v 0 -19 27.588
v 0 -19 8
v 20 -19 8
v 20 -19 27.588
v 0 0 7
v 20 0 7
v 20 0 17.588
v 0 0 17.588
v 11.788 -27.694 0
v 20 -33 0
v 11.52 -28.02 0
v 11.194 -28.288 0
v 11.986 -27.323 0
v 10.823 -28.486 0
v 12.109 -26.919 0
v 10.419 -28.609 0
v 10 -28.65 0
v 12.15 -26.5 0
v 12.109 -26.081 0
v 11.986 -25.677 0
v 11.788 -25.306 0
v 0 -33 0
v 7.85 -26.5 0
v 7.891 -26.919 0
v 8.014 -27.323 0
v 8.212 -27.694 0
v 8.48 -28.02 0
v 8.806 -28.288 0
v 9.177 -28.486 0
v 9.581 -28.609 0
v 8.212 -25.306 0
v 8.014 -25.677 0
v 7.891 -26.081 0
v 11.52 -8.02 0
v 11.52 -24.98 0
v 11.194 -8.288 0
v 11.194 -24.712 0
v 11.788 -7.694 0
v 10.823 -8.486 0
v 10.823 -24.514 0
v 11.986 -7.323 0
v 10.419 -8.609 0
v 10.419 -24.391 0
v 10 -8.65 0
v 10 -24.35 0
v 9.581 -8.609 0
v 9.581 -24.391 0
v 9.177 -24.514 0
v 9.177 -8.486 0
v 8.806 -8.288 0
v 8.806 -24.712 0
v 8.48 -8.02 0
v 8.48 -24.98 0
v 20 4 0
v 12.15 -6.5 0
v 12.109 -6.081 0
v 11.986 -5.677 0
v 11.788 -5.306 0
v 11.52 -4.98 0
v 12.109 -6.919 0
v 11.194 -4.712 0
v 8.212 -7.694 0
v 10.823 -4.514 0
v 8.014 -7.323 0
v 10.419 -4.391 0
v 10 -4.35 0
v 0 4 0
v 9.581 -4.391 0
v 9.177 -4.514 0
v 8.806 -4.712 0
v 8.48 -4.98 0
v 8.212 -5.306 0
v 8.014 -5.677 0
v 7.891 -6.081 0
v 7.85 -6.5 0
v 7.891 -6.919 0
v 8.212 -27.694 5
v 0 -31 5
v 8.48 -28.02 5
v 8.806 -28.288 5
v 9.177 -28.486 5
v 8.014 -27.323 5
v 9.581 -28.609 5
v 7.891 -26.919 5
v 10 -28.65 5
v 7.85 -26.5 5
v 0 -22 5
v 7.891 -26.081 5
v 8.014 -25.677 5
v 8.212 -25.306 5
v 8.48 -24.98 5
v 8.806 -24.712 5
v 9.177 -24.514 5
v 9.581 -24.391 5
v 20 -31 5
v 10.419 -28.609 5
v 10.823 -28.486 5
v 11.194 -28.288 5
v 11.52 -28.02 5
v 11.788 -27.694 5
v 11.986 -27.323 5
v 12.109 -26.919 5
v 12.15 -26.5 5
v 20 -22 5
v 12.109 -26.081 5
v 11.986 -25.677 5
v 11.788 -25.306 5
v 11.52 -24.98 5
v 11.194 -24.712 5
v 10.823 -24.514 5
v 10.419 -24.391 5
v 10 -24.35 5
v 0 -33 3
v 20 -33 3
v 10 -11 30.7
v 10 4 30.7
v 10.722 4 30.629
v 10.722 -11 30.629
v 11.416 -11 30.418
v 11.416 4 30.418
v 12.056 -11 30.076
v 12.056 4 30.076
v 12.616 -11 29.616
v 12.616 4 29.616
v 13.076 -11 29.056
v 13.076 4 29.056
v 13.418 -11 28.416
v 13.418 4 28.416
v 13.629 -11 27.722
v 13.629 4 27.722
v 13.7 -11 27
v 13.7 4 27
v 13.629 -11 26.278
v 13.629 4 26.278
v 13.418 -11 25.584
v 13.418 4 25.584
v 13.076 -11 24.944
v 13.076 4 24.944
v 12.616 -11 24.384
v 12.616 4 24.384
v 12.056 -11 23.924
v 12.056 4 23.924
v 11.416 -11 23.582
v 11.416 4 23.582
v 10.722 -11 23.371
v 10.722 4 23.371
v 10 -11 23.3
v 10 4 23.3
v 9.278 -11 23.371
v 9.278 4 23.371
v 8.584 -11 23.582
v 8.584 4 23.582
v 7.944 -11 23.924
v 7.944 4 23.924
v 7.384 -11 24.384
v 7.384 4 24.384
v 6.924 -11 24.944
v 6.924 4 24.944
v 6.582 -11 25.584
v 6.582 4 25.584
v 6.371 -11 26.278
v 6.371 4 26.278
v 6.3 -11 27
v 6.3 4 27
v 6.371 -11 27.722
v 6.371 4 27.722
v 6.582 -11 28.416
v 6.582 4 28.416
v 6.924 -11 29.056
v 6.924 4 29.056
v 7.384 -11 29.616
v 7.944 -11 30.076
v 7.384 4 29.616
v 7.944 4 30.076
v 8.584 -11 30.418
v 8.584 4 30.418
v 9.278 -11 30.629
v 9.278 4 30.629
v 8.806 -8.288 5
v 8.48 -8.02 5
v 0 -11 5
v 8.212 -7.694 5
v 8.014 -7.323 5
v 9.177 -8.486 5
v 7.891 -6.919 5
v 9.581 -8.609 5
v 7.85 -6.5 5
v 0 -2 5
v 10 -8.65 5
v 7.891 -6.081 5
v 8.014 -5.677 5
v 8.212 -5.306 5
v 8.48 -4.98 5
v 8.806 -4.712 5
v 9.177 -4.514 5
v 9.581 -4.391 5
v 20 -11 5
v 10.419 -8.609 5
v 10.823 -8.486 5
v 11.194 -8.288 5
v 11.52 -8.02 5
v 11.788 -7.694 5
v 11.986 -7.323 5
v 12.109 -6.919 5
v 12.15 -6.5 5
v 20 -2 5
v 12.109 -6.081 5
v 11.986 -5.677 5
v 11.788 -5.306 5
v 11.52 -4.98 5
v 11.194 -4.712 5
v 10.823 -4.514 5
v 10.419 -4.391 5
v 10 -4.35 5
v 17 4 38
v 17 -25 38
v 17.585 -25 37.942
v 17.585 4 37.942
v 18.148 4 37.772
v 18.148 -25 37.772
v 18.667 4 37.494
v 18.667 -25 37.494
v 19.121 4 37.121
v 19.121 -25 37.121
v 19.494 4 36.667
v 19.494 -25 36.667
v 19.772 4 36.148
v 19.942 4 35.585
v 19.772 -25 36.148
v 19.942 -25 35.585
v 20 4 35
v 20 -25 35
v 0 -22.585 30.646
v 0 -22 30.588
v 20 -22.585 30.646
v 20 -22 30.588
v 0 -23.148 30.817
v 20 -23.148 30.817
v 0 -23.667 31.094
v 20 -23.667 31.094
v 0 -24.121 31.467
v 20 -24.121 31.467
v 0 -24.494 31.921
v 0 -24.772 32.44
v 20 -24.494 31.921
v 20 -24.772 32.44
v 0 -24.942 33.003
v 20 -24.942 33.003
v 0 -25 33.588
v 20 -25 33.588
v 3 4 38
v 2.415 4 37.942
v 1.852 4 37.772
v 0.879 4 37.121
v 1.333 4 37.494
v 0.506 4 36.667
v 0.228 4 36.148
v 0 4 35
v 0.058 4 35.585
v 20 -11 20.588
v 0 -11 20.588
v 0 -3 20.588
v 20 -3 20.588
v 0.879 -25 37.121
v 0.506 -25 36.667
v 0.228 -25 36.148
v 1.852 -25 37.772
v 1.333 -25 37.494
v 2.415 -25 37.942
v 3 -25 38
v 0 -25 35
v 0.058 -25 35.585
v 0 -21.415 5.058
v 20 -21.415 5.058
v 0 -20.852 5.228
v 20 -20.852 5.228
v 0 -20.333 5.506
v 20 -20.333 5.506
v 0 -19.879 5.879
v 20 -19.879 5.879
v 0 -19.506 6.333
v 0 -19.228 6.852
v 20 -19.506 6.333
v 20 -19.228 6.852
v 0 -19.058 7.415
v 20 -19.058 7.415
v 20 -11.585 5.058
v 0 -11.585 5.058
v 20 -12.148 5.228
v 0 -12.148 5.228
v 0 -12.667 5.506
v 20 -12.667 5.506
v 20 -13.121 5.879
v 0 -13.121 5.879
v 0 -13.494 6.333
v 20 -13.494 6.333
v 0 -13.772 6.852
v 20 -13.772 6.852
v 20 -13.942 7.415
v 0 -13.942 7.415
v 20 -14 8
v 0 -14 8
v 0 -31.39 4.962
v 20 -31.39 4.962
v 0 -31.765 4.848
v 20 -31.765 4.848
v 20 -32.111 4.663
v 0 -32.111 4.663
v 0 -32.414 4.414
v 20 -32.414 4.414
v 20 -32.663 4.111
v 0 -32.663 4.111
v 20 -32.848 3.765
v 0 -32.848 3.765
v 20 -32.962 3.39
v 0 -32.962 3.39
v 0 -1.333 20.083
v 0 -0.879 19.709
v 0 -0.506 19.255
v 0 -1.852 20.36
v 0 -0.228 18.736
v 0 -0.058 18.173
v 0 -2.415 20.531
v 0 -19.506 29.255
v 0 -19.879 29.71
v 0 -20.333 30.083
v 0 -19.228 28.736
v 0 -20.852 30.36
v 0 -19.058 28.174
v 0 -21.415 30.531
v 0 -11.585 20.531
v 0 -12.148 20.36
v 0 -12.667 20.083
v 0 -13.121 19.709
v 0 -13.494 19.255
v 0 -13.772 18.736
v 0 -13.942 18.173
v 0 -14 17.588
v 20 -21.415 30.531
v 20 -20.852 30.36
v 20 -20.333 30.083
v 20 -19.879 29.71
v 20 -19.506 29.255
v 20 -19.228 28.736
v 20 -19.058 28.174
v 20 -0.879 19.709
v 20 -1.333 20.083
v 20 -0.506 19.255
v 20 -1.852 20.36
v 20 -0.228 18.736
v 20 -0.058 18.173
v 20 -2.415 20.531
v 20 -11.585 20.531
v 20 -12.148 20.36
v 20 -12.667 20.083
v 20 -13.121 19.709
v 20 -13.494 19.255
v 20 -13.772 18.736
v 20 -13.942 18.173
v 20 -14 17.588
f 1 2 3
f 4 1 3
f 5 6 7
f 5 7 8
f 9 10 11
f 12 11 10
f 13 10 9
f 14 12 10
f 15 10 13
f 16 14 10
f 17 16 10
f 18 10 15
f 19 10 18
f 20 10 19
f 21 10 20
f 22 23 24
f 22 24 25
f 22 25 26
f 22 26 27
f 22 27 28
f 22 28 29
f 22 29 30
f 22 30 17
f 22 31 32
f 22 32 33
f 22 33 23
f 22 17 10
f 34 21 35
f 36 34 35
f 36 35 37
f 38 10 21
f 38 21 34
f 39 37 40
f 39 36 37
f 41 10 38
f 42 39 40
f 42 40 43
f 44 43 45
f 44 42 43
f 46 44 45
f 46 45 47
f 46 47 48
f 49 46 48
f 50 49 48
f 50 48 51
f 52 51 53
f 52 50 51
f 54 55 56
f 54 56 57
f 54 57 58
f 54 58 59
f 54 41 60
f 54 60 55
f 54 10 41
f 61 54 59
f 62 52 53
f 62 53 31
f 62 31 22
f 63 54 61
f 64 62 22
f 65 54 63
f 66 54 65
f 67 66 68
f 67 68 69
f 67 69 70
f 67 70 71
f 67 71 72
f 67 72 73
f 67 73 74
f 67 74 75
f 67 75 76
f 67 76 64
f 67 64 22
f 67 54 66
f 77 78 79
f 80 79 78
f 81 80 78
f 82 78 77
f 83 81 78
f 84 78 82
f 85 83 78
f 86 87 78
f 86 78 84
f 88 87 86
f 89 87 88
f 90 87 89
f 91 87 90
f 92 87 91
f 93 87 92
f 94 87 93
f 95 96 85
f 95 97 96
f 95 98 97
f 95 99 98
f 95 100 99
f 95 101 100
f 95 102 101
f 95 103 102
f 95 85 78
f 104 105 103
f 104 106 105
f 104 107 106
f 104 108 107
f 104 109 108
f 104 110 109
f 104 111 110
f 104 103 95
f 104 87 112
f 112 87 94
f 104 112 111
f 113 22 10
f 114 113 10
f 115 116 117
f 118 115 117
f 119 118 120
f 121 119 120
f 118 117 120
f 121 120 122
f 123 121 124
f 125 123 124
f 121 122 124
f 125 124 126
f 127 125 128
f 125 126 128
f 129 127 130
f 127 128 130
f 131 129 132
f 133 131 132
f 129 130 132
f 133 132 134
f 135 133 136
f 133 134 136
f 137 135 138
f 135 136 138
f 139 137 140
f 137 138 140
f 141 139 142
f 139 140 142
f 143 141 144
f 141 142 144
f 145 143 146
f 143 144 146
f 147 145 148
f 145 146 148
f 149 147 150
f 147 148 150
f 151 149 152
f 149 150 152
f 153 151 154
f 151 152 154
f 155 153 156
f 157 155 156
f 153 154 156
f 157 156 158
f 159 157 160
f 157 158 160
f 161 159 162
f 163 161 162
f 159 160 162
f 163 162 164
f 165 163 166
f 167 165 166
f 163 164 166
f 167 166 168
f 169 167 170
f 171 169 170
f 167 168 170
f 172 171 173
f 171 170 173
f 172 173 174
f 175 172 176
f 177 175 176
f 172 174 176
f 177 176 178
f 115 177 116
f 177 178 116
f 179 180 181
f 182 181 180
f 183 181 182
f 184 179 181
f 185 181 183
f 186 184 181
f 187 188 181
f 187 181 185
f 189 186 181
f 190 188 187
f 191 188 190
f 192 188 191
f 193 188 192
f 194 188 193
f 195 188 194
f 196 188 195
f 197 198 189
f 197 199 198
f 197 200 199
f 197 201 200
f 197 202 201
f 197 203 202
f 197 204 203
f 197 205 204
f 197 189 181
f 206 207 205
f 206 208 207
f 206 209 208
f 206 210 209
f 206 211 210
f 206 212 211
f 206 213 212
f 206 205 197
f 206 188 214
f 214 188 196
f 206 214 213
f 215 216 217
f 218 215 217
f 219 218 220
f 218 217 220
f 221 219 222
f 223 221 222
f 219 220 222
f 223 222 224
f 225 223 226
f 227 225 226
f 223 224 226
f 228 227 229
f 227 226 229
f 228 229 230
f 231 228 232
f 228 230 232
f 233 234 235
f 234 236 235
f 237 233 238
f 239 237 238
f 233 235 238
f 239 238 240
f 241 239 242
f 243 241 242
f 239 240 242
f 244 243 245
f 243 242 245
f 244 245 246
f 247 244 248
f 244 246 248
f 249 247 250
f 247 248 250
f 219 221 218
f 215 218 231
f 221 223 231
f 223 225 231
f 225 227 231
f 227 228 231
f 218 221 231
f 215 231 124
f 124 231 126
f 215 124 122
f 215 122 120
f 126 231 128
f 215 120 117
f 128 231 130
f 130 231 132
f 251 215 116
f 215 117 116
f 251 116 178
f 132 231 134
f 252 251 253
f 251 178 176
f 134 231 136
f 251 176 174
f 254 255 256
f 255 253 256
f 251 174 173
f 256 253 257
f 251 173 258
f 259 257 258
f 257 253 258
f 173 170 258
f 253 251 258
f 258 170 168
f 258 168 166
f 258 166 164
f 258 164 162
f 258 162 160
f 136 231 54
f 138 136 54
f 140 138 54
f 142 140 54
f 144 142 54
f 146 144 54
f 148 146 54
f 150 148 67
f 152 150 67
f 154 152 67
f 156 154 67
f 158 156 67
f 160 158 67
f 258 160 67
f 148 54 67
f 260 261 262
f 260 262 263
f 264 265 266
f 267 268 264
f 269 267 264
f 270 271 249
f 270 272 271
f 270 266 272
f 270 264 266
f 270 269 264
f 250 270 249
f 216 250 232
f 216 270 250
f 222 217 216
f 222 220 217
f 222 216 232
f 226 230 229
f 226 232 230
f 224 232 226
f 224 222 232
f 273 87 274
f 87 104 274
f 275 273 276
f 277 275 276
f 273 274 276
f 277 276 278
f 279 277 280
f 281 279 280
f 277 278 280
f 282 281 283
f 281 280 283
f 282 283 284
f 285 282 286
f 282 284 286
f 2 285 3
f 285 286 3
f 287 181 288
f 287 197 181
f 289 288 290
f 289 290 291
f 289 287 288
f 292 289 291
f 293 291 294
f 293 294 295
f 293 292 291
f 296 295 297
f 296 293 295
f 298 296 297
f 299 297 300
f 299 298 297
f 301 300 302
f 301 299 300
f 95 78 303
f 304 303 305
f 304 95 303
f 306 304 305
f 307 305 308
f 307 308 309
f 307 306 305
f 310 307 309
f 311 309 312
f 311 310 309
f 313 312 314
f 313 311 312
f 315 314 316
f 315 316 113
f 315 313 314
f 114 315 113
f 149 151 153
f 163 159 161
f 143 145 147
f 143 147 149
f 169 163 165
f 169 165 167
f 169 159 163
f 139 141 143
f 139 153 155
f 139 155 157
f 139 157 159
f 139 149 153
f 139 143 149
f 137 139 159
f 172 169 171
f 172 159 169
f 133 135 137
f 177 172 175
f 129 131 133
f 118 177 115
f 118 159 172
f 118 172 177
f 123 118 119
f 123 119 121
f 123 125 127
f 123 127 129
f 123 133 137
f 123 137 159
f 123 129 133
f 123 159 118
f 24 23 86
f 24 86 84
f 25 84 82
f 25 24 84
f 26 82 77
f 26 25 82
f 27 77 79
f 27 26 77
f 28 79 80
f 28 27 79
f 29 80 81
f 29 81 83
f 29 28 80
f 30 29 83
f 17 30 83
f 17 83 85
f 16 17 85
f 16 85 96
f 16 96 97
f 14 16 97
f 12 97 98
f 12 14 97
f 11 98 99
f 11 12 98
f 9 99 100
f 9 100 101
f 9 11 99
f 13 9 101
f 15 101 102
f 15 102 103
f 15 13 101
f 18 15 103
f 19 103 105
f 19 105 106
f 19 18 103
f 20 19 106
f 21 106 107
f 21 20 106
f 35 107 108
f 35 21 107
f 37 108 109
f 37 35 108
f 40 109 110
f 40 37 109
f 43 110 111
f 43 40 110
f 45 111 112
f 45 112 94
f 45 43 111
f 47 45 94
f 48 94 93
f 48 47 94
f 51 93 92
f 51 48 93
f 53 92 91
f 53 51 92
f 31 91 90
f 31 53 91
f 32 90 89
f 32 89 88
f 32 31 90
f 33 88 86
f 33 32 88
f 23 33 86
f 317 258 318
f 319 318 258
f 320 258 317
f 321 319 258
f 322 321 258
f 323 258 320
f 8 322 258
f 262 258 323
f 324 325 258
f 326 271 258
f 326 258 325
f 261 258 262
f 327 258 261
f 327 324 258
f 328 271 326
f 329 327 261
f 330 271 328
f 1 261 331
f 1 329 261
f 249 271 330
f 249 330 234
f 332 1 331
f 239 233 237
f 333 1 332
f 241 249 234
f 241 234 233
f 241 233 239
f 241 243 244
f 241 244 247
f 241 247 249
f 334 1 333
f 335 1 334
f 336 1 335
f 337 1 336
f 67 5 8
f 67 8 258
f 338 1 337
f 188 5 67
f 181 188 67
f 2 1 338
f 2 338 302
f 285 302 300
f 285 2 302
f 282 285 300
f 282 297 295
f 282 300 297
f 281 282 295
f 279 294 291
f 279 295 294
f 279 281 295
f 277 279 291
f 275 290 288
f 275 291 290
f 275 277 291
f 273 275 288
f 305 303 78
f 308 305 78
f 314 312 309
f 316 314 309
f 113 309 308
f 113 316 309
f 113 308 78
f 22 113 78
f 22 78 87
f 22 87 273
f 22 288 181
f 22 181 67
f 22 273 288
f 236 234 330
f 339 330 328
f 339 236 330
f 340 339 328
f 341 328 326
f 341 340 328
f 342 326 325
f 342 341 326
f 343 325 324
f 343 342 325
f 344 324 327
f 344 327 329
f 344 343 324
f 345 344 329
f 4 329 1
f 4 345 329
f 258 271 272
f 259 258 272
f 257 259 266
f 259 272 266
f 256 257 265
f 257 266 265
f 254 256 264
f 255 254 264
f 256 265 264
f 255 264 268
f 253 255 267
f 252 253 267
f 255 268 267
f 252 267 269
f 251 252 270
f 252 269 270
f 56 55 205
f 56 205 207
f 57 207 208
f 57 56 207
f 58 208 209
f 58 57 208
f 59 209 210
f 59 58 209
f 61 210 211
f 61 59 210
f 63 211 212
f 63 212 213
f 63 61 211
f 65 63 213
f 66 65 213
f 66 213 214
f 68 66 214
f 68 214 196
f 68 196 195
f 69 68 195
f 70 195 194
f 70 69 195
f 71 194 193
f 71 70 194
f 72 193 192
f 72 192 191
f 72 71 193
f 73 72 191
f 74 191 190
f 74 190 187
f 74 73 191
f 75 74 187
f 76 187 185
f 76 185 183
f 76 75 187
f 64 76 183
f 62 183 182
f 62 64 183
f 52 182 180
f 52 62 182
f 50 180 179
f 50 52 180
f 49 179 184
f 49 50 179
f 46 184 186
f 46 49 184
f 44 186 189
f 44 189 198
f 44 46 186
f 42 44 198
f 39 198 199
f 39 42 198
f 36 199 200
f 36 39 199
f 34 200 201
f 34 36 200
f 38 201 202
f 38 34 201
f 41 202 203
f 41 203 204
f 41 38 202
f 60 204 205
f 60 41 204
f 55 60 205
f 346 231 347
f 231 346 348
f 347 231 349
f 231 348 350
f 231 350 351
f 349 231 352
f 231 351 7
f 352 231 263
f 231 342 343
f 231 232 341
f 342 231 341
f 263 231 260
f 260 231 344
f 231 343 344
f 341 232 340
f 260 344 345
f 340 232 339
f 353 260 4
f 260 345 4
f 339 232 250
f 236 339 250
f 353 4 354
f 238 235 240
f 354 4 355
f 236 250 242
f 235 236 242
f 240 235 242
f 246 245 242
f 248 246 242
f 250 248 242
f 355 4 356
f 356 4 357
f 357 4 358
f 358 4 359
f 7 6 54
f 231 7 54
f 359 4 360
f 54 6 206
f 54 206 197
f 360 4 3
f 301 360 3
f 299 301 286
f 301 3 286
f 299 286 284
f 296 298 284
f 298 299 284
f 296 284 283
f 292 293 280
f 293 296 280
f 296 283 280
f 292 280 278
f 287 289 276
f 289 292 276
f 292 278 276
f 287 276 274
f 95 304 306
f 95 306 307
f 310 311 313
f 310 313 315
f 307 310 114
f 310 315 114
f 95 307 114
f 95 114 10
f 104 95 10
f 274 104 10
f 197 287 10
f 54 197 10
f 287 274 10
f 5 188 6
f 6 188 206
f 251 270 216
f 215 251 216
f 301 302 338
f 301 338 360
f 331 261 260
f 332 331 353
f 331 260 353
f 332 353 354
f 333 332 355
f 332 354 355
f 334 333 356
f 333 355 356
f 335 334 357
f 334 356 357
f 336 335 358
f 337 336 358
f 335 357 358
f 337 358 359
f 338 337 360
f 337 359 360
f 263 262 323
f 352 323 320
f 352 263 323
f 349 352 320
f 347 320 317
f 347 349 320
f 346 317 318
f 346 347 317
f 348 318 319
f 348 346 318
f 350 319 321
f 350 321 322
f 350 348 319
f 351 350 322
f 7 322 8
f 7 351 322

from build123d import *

# Parameters (mm, degrees)
SKETCH1_W           = 20
SKETCH1_H           = 33
SKETCH1_R           = 2.15
BOSS_EXTRUDE1_DEPTH = 5
SKETCH2_W           = 20
SKETCH2_H           = 4
BOSS_EXTRUDE2_DEPTH = 38
SKETCH4_W           = 20
SKETCH4_H           = 7.411842069
BOSS_EXTRUDE3_DEPTH = 25
FILLET1_R           = 3
FILLET2_R           = 2
FILLET4_R           = 3
CHAMFER2_SIZE       = 2
SKETCH8_W           = 20
SKETCH8_H           = 5
BOSS_EXTRUDE5_DEPTH = 25.588157931
FILLET7_R           = 3
SKETCH12_W          = 20
SKETCH12_H          = 10
BOSS_EXTRUDE6_DEPTH = 14
SKETCH3_R           = 3.7
CUT_EXTRUDE2_DEPTH  = 15
FILLET8_R           = 3


with BuildPart() as part:
    # Sketch1 → Boss-Extrude1 (new body)
    with BuildSketch(Plane.XY):
        with Locations((10, -16.5)):
            Rectangle(SKETCH1_W, SKETCH1_H)
        with Locations((10, -6.5)):
            Circle(SKETCH1_R, mode=Mode.SUBTRACT)
        with Locations(Location((10, -26.5, 0), (0, 0, 180))):
            Circle(SKETCH1_R, mode=Mode.SUBTRACT)
    extrude(amount=BOSS_EXTRUDE1_DEPTH)

    # Sketch2 → Boss-Extrude2 (add)
    with BuildSketch(Plane(origin=(0, 0, 0), x_dir=(-1, 0, 0), z_dir=(0, 0, -1))):
        with Locations((-10, 2)):
            Rectangle(SKETCH2_W, SKETCH2_H)
    extrude(amount=-BOSS_EXTRUDE2_DEPTH)

    # Sketch4 → Boss-Extrude3 (add)
    with BuildSketch(Plane.XZ):
        with Locations((10, 34.294078965)):
            Rectangle(SKETCH4_W, SKETCH4_H)
    extrude(amount=BOSS_EXTRUDE3_DEPTH)

    # Fillet1
    fillet1_edges = [part.edges().sort_by_distance(p)[0] for p in [
        (20, -10.5, 38),
        (0, -10.5, 38),
    ]]
    fillet(fillet1_edges, radius=FILLET1_R)

    # Fillet2
    fillet2_edges = [part.edges().sort_by_distance(p)[0] for p in [
        (10, -33, 5),
    ]]
    fillet(fillet2_edges, radius=FILLET2_R)

    # Fillet4
    fillet4_edges = [part.edges().sort_by_distance(p)[0] for p in [
        (10, -25, 30.588157931),
    ]]
    fillet(fillet4_edges, radius=FILLET4_R)

    # Chamfer2
    chamfer2_edges = [part.edges().sort_by_distance(p)[0] for p in [
        (10, 0, 5),
    ]]
    chamfer(chamfer2_edges, length=CHAMFER2_SIZE)

    # Sketch8 → Boss-Extrude5 (add)
    with BuildSketch(Plane.XY.offset(5)):
        with Locations((10, -16.5)):
            Rectangle(SKETCH8_W, SKETCH8_H)
    extrude(amount=BOSS_EXTRUDE5_DEPTH)

    # Fillet7
    fillet7_edges = [part.edges().sort_by_distance(p)[0] for p in [
        (10, -19, 5),
        (10, -19, 30.588157931),
        (10, -14, 5),
    ]]
    fillet(fillet7_edges, radius=FILLET7_R - 0.0001)  # a hair under: the kernel refuses the full size

    # Sketch12 → Boss-Extrude6 (add)
    with BuildSketch(Plane(origin=(0, -14, 0), x_dir=(1, 0, 0), z_dir=(0, 1, 0))):
        with Locations((10, -25.588157931)):
            Rectangle(SKETCH12_W, SKETCH12_H)
    extrude(amount=BOSS_EXTRUDE6_DEPTH)

    # Sketch3 → Cut-Extrude2 (cut)
    with BuildSketch(Plane(origin=(0, 4, 0), x_dir=(1, 0, 0), z_dir=(0, 1, 0))):
        with Locations(Location((10, -27, 0), (0, 0, 270))):
            Circle(SKETCH3_R)
    extrude(amount=-CUT_EXTRUDE2_DEPTH, mode=Mode.SUBTRACT)

    # Fillet8
    fillet8_edges = [part.edges().sort_by_distance(p)[0] for p in [
        (10, 0, 20.588157931),
        (10, -14, 20.588157931),
    ]]
    fillet(fillet8_edges, radius=FILLET8_R)


solid = part.part
